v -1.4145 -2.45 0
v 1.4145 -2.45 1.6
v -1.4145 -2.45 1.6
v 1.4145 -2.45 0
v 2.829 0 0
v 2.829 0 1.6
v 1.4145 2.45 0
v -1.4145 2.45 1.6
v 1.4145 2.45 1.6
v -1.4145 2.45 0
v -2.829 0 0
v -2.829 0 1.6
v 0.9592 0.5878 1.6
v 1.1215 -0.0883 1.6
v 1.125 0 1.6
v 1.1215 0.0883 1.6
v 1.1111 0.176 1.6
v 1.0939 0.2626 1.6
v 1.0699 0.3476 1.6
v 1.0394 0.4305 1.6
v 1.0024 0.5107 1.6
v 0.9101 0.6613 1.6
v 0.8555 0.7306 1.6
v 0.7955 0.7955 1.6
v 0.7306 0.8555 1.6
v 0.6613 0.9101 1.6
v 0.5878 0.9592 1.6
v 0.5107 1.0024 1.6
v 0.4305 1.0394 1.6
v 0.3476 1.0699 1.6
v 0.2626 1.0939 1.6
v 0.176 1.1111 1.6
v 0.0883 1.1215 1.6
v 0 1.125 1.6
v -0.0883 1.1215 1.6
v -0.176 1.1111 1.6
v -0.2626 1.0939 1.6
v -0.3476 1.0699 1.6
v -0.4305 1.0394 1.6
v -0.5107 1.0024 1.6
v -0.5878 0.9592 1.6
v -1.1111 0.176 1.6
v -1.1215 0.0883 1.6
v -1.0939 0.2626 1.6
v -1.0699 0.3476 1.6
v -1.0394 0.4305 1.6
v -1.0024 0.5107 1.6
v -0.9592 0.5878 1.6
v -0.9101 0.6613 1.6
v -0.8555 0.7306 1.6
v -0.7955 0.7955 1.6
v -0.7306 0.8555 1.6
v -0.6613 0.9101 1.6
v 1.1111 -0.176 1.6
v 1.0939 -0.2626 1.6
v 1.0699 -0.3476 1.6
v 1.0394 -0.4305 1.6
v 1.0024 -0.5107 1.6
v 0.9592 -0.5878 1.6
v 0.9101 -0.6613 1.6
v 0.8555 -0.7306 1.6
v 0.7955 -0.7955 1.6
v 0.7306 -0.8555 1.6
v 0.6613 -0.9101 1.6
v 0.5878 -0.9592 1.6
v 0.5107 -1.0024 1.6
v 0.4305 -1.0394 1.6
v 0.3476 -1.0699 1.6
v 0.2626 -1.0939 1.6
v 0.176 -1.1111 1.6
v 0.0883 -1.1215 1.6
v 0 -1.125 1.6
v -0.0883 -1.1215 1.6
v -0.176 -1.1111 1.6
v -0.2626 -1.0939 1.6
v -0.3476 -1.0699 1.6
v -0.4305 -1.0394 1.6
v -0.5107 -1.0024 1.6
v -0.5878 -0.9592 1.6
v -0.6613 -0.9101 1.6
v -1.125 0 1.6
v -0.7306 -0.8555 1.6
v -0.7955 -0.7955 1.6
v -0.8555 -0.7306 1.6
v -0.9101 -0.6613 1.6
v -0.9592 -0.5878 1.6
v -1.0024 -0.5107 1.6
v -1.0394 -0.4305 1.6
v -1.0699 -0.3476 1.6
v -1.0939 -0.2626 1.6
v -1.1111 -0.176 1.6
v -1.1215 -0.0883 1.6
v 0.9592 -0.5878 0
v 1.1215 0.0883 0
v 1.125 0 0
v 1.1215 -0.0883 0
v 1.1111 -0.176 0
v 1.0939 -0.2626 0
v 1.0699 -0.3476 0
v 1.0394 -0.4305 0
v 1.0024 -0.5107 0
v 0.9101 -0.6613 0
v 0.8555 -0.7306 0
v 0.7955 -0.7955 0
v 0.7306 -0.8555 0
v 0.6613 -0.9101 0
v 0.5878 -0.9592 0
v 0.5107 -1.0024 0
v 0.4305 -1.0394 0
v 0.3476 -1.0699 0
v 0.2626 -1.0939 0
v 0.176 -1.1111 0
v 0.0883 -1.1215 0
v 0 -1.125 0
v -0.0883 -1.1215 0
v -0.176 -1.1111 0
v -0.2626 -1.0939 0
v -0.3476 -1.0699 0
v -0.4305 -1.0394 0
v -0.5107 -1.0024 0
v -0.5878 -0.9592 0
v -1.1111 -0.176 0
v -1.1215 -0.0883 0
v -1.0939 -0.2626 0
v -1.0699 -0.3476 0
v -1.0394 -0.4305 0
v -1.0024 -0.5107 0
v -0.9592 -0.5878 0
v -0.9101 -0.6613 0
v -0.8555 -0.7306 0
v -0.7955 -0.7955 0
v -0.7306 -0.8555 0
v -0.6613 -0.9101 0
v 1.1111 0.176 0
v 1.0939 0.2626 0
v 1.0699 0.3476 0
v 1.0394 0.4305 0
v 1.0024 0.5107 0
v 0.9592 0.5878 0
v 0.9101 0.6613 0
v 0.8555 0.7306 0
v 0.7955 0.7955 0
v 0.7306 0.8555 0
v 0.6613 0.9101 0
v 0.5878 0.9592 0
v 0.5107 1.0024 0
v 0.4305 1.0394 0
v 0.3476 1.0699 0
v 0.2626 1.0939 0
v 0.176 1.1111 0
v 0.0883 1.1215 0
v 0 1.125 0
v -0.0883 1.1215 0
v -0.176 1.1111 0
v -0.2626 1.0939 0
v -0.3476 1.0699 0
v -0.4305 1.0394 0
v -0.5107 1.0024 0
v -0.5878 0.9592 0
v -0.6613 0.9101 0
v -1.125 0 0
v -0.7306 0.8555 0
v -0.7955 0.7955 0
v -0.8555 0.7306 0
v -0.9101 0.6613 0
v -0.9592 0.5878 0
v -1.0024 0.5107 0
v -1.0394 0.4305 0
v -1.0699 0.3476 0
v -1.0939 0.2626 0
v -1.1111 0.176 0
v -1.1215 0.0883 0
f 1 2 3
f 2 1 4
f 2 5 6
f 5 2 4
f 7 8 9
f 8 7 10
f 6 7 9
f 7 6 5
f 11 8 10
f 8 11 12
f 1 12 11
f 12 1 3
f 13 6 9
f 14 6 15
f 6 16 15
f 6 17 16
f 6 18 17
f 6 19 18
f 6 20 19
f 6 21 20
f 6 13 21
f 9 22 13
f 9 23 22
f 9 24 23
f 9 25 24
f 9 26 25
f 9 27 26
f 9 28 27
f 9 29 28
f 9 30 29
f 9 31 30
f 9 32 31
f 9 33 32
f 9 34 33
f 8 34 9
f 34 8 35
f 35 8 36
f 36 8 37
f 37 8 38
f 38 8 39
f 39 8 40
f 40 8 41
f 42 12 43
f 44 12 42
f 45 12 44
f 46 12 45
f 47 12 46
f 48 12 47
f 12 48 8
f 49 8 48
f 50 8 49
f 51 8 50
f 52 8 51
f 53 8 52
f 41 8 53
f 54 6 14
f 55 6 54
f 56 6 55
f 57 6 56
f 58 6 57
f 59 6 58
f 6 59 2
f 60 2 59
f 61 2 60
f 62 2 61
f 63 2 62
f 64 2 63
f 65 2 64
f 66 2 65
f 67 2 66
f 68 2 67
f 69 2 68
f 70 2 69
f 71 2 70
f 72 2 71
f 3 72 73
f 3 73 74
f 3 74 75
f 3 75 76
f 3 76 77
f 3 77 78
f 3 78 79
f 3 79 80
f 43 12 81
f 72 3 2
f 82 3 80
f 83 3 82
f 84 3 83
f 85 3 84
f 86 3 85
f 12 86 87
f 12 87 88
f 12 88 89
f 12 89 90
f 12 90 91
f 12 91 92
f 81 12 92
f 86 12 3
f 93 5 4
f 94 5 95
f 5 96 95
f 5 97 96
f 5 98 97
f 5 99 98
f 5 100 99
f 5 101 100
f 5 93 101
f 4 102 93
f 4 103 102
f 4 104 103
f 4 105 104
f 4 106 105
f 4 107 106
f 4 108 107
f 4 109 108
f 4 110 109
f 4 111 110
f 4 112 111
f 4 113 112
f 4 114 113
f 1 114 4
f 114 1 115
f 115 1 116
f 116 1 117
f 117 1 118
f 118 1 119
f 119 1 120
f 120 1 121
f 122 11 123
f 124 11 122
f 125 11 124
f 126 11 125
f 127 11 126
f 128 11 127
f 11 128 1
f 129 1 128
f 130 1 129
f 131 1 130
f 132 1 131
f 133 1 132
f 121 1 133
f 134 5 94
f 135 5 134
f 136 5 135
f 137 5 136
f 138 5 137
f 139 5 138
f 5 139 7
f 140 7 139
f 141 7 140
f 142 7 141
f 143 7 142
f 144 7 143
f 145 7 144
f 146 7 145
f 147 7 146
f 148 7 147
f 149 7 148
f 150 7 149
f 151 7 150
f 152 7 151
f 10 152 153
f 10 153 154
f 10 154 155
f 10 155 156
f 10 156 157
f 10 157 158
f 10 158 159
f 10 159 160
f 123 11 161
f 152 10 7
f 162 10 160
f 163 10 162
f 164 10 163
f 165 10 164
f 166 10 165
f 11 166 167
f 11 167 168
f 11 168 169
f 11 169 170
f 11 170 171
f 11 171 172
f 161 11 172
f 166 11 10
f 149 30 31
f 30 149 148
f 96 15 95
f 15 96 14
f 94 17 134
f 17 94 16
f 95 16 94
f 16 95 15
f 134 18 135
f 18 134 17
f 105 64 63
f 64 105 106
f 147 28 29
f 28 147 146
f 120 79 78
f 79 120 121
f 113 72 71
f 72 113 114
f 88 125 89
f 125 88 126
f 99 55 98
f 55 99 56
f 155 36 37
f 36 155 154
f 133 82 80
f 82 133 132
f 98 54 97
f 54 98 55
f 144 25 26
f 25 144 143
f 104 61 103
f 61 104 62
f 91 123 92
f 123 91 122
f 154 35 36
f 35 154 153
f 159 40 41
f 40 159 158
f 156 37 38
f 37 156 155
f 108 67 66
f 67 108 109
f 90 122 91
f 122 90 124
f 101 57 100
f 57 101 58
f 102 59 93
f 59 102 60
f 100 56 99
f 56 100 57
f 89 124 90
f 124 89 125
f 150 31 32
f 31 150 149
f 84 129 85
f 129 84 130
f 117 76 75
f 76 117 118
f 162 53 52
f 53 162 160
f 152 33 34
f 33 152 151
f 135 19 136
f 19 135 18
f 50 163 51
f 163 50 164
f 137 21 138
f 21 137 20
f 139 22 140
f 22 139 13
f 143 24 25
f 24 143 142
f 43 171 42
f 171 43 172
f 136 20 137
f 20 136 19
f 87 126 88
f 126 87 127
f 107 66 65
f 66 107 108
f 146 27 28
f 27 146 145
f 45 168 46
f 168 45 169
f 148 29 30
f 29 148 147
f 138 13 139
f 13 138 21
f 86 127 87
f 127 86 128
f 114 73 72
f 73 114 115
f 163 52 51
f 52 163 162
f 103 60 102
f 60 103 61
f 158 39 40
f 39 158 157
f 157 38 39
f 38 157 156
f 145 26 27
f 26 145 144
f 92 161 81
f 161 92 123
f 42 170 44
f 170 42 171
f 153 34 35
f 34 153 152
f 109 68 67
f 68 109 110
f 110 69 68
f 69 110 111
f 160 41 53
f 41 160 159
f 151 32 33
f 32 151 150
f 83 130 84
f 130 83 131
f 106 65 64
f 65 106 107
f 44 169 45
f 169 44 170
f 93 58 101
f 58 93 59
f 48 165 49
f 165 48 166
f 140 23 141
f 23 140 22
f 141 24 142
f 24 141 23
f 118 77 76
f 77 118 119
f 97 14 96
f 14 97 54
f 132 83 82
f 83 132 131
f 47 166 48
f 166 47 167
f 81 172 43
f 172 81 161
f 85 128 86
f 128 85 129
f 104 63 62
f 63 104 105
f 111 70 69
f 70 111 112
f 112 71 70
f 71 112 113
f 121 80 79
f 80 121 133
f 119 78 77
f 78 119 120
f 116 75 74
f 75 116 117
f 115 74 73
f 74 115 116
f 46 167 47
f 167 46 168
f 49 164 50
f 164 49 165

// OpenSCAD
$fn = 120;

across_flats = 4.9;   // mm
thickness    = 1.6;   // mm
screw_d      = 2.0;   // mm (nominal)

clearance    = 0.25;  // mm added to screw diameter for through-hole
hole_d       = screw_d + clearance;

module hex_prism(af, h){
    // For a regular hexagon: across_flats = 2 * apothem
    // Circumradius R = apothem / cos(30°) = (af/2)/cos(30°)
    R = (af/2) / cos(30);
    cylinder(h=h, r=R, $fn=6);
}

difference() {
    hex_prism(across_flats, thickness);
    translate([0,0,-0.1])
        cylinder(h=thickness+0.2, d=hole_d, $fn=80);
}
